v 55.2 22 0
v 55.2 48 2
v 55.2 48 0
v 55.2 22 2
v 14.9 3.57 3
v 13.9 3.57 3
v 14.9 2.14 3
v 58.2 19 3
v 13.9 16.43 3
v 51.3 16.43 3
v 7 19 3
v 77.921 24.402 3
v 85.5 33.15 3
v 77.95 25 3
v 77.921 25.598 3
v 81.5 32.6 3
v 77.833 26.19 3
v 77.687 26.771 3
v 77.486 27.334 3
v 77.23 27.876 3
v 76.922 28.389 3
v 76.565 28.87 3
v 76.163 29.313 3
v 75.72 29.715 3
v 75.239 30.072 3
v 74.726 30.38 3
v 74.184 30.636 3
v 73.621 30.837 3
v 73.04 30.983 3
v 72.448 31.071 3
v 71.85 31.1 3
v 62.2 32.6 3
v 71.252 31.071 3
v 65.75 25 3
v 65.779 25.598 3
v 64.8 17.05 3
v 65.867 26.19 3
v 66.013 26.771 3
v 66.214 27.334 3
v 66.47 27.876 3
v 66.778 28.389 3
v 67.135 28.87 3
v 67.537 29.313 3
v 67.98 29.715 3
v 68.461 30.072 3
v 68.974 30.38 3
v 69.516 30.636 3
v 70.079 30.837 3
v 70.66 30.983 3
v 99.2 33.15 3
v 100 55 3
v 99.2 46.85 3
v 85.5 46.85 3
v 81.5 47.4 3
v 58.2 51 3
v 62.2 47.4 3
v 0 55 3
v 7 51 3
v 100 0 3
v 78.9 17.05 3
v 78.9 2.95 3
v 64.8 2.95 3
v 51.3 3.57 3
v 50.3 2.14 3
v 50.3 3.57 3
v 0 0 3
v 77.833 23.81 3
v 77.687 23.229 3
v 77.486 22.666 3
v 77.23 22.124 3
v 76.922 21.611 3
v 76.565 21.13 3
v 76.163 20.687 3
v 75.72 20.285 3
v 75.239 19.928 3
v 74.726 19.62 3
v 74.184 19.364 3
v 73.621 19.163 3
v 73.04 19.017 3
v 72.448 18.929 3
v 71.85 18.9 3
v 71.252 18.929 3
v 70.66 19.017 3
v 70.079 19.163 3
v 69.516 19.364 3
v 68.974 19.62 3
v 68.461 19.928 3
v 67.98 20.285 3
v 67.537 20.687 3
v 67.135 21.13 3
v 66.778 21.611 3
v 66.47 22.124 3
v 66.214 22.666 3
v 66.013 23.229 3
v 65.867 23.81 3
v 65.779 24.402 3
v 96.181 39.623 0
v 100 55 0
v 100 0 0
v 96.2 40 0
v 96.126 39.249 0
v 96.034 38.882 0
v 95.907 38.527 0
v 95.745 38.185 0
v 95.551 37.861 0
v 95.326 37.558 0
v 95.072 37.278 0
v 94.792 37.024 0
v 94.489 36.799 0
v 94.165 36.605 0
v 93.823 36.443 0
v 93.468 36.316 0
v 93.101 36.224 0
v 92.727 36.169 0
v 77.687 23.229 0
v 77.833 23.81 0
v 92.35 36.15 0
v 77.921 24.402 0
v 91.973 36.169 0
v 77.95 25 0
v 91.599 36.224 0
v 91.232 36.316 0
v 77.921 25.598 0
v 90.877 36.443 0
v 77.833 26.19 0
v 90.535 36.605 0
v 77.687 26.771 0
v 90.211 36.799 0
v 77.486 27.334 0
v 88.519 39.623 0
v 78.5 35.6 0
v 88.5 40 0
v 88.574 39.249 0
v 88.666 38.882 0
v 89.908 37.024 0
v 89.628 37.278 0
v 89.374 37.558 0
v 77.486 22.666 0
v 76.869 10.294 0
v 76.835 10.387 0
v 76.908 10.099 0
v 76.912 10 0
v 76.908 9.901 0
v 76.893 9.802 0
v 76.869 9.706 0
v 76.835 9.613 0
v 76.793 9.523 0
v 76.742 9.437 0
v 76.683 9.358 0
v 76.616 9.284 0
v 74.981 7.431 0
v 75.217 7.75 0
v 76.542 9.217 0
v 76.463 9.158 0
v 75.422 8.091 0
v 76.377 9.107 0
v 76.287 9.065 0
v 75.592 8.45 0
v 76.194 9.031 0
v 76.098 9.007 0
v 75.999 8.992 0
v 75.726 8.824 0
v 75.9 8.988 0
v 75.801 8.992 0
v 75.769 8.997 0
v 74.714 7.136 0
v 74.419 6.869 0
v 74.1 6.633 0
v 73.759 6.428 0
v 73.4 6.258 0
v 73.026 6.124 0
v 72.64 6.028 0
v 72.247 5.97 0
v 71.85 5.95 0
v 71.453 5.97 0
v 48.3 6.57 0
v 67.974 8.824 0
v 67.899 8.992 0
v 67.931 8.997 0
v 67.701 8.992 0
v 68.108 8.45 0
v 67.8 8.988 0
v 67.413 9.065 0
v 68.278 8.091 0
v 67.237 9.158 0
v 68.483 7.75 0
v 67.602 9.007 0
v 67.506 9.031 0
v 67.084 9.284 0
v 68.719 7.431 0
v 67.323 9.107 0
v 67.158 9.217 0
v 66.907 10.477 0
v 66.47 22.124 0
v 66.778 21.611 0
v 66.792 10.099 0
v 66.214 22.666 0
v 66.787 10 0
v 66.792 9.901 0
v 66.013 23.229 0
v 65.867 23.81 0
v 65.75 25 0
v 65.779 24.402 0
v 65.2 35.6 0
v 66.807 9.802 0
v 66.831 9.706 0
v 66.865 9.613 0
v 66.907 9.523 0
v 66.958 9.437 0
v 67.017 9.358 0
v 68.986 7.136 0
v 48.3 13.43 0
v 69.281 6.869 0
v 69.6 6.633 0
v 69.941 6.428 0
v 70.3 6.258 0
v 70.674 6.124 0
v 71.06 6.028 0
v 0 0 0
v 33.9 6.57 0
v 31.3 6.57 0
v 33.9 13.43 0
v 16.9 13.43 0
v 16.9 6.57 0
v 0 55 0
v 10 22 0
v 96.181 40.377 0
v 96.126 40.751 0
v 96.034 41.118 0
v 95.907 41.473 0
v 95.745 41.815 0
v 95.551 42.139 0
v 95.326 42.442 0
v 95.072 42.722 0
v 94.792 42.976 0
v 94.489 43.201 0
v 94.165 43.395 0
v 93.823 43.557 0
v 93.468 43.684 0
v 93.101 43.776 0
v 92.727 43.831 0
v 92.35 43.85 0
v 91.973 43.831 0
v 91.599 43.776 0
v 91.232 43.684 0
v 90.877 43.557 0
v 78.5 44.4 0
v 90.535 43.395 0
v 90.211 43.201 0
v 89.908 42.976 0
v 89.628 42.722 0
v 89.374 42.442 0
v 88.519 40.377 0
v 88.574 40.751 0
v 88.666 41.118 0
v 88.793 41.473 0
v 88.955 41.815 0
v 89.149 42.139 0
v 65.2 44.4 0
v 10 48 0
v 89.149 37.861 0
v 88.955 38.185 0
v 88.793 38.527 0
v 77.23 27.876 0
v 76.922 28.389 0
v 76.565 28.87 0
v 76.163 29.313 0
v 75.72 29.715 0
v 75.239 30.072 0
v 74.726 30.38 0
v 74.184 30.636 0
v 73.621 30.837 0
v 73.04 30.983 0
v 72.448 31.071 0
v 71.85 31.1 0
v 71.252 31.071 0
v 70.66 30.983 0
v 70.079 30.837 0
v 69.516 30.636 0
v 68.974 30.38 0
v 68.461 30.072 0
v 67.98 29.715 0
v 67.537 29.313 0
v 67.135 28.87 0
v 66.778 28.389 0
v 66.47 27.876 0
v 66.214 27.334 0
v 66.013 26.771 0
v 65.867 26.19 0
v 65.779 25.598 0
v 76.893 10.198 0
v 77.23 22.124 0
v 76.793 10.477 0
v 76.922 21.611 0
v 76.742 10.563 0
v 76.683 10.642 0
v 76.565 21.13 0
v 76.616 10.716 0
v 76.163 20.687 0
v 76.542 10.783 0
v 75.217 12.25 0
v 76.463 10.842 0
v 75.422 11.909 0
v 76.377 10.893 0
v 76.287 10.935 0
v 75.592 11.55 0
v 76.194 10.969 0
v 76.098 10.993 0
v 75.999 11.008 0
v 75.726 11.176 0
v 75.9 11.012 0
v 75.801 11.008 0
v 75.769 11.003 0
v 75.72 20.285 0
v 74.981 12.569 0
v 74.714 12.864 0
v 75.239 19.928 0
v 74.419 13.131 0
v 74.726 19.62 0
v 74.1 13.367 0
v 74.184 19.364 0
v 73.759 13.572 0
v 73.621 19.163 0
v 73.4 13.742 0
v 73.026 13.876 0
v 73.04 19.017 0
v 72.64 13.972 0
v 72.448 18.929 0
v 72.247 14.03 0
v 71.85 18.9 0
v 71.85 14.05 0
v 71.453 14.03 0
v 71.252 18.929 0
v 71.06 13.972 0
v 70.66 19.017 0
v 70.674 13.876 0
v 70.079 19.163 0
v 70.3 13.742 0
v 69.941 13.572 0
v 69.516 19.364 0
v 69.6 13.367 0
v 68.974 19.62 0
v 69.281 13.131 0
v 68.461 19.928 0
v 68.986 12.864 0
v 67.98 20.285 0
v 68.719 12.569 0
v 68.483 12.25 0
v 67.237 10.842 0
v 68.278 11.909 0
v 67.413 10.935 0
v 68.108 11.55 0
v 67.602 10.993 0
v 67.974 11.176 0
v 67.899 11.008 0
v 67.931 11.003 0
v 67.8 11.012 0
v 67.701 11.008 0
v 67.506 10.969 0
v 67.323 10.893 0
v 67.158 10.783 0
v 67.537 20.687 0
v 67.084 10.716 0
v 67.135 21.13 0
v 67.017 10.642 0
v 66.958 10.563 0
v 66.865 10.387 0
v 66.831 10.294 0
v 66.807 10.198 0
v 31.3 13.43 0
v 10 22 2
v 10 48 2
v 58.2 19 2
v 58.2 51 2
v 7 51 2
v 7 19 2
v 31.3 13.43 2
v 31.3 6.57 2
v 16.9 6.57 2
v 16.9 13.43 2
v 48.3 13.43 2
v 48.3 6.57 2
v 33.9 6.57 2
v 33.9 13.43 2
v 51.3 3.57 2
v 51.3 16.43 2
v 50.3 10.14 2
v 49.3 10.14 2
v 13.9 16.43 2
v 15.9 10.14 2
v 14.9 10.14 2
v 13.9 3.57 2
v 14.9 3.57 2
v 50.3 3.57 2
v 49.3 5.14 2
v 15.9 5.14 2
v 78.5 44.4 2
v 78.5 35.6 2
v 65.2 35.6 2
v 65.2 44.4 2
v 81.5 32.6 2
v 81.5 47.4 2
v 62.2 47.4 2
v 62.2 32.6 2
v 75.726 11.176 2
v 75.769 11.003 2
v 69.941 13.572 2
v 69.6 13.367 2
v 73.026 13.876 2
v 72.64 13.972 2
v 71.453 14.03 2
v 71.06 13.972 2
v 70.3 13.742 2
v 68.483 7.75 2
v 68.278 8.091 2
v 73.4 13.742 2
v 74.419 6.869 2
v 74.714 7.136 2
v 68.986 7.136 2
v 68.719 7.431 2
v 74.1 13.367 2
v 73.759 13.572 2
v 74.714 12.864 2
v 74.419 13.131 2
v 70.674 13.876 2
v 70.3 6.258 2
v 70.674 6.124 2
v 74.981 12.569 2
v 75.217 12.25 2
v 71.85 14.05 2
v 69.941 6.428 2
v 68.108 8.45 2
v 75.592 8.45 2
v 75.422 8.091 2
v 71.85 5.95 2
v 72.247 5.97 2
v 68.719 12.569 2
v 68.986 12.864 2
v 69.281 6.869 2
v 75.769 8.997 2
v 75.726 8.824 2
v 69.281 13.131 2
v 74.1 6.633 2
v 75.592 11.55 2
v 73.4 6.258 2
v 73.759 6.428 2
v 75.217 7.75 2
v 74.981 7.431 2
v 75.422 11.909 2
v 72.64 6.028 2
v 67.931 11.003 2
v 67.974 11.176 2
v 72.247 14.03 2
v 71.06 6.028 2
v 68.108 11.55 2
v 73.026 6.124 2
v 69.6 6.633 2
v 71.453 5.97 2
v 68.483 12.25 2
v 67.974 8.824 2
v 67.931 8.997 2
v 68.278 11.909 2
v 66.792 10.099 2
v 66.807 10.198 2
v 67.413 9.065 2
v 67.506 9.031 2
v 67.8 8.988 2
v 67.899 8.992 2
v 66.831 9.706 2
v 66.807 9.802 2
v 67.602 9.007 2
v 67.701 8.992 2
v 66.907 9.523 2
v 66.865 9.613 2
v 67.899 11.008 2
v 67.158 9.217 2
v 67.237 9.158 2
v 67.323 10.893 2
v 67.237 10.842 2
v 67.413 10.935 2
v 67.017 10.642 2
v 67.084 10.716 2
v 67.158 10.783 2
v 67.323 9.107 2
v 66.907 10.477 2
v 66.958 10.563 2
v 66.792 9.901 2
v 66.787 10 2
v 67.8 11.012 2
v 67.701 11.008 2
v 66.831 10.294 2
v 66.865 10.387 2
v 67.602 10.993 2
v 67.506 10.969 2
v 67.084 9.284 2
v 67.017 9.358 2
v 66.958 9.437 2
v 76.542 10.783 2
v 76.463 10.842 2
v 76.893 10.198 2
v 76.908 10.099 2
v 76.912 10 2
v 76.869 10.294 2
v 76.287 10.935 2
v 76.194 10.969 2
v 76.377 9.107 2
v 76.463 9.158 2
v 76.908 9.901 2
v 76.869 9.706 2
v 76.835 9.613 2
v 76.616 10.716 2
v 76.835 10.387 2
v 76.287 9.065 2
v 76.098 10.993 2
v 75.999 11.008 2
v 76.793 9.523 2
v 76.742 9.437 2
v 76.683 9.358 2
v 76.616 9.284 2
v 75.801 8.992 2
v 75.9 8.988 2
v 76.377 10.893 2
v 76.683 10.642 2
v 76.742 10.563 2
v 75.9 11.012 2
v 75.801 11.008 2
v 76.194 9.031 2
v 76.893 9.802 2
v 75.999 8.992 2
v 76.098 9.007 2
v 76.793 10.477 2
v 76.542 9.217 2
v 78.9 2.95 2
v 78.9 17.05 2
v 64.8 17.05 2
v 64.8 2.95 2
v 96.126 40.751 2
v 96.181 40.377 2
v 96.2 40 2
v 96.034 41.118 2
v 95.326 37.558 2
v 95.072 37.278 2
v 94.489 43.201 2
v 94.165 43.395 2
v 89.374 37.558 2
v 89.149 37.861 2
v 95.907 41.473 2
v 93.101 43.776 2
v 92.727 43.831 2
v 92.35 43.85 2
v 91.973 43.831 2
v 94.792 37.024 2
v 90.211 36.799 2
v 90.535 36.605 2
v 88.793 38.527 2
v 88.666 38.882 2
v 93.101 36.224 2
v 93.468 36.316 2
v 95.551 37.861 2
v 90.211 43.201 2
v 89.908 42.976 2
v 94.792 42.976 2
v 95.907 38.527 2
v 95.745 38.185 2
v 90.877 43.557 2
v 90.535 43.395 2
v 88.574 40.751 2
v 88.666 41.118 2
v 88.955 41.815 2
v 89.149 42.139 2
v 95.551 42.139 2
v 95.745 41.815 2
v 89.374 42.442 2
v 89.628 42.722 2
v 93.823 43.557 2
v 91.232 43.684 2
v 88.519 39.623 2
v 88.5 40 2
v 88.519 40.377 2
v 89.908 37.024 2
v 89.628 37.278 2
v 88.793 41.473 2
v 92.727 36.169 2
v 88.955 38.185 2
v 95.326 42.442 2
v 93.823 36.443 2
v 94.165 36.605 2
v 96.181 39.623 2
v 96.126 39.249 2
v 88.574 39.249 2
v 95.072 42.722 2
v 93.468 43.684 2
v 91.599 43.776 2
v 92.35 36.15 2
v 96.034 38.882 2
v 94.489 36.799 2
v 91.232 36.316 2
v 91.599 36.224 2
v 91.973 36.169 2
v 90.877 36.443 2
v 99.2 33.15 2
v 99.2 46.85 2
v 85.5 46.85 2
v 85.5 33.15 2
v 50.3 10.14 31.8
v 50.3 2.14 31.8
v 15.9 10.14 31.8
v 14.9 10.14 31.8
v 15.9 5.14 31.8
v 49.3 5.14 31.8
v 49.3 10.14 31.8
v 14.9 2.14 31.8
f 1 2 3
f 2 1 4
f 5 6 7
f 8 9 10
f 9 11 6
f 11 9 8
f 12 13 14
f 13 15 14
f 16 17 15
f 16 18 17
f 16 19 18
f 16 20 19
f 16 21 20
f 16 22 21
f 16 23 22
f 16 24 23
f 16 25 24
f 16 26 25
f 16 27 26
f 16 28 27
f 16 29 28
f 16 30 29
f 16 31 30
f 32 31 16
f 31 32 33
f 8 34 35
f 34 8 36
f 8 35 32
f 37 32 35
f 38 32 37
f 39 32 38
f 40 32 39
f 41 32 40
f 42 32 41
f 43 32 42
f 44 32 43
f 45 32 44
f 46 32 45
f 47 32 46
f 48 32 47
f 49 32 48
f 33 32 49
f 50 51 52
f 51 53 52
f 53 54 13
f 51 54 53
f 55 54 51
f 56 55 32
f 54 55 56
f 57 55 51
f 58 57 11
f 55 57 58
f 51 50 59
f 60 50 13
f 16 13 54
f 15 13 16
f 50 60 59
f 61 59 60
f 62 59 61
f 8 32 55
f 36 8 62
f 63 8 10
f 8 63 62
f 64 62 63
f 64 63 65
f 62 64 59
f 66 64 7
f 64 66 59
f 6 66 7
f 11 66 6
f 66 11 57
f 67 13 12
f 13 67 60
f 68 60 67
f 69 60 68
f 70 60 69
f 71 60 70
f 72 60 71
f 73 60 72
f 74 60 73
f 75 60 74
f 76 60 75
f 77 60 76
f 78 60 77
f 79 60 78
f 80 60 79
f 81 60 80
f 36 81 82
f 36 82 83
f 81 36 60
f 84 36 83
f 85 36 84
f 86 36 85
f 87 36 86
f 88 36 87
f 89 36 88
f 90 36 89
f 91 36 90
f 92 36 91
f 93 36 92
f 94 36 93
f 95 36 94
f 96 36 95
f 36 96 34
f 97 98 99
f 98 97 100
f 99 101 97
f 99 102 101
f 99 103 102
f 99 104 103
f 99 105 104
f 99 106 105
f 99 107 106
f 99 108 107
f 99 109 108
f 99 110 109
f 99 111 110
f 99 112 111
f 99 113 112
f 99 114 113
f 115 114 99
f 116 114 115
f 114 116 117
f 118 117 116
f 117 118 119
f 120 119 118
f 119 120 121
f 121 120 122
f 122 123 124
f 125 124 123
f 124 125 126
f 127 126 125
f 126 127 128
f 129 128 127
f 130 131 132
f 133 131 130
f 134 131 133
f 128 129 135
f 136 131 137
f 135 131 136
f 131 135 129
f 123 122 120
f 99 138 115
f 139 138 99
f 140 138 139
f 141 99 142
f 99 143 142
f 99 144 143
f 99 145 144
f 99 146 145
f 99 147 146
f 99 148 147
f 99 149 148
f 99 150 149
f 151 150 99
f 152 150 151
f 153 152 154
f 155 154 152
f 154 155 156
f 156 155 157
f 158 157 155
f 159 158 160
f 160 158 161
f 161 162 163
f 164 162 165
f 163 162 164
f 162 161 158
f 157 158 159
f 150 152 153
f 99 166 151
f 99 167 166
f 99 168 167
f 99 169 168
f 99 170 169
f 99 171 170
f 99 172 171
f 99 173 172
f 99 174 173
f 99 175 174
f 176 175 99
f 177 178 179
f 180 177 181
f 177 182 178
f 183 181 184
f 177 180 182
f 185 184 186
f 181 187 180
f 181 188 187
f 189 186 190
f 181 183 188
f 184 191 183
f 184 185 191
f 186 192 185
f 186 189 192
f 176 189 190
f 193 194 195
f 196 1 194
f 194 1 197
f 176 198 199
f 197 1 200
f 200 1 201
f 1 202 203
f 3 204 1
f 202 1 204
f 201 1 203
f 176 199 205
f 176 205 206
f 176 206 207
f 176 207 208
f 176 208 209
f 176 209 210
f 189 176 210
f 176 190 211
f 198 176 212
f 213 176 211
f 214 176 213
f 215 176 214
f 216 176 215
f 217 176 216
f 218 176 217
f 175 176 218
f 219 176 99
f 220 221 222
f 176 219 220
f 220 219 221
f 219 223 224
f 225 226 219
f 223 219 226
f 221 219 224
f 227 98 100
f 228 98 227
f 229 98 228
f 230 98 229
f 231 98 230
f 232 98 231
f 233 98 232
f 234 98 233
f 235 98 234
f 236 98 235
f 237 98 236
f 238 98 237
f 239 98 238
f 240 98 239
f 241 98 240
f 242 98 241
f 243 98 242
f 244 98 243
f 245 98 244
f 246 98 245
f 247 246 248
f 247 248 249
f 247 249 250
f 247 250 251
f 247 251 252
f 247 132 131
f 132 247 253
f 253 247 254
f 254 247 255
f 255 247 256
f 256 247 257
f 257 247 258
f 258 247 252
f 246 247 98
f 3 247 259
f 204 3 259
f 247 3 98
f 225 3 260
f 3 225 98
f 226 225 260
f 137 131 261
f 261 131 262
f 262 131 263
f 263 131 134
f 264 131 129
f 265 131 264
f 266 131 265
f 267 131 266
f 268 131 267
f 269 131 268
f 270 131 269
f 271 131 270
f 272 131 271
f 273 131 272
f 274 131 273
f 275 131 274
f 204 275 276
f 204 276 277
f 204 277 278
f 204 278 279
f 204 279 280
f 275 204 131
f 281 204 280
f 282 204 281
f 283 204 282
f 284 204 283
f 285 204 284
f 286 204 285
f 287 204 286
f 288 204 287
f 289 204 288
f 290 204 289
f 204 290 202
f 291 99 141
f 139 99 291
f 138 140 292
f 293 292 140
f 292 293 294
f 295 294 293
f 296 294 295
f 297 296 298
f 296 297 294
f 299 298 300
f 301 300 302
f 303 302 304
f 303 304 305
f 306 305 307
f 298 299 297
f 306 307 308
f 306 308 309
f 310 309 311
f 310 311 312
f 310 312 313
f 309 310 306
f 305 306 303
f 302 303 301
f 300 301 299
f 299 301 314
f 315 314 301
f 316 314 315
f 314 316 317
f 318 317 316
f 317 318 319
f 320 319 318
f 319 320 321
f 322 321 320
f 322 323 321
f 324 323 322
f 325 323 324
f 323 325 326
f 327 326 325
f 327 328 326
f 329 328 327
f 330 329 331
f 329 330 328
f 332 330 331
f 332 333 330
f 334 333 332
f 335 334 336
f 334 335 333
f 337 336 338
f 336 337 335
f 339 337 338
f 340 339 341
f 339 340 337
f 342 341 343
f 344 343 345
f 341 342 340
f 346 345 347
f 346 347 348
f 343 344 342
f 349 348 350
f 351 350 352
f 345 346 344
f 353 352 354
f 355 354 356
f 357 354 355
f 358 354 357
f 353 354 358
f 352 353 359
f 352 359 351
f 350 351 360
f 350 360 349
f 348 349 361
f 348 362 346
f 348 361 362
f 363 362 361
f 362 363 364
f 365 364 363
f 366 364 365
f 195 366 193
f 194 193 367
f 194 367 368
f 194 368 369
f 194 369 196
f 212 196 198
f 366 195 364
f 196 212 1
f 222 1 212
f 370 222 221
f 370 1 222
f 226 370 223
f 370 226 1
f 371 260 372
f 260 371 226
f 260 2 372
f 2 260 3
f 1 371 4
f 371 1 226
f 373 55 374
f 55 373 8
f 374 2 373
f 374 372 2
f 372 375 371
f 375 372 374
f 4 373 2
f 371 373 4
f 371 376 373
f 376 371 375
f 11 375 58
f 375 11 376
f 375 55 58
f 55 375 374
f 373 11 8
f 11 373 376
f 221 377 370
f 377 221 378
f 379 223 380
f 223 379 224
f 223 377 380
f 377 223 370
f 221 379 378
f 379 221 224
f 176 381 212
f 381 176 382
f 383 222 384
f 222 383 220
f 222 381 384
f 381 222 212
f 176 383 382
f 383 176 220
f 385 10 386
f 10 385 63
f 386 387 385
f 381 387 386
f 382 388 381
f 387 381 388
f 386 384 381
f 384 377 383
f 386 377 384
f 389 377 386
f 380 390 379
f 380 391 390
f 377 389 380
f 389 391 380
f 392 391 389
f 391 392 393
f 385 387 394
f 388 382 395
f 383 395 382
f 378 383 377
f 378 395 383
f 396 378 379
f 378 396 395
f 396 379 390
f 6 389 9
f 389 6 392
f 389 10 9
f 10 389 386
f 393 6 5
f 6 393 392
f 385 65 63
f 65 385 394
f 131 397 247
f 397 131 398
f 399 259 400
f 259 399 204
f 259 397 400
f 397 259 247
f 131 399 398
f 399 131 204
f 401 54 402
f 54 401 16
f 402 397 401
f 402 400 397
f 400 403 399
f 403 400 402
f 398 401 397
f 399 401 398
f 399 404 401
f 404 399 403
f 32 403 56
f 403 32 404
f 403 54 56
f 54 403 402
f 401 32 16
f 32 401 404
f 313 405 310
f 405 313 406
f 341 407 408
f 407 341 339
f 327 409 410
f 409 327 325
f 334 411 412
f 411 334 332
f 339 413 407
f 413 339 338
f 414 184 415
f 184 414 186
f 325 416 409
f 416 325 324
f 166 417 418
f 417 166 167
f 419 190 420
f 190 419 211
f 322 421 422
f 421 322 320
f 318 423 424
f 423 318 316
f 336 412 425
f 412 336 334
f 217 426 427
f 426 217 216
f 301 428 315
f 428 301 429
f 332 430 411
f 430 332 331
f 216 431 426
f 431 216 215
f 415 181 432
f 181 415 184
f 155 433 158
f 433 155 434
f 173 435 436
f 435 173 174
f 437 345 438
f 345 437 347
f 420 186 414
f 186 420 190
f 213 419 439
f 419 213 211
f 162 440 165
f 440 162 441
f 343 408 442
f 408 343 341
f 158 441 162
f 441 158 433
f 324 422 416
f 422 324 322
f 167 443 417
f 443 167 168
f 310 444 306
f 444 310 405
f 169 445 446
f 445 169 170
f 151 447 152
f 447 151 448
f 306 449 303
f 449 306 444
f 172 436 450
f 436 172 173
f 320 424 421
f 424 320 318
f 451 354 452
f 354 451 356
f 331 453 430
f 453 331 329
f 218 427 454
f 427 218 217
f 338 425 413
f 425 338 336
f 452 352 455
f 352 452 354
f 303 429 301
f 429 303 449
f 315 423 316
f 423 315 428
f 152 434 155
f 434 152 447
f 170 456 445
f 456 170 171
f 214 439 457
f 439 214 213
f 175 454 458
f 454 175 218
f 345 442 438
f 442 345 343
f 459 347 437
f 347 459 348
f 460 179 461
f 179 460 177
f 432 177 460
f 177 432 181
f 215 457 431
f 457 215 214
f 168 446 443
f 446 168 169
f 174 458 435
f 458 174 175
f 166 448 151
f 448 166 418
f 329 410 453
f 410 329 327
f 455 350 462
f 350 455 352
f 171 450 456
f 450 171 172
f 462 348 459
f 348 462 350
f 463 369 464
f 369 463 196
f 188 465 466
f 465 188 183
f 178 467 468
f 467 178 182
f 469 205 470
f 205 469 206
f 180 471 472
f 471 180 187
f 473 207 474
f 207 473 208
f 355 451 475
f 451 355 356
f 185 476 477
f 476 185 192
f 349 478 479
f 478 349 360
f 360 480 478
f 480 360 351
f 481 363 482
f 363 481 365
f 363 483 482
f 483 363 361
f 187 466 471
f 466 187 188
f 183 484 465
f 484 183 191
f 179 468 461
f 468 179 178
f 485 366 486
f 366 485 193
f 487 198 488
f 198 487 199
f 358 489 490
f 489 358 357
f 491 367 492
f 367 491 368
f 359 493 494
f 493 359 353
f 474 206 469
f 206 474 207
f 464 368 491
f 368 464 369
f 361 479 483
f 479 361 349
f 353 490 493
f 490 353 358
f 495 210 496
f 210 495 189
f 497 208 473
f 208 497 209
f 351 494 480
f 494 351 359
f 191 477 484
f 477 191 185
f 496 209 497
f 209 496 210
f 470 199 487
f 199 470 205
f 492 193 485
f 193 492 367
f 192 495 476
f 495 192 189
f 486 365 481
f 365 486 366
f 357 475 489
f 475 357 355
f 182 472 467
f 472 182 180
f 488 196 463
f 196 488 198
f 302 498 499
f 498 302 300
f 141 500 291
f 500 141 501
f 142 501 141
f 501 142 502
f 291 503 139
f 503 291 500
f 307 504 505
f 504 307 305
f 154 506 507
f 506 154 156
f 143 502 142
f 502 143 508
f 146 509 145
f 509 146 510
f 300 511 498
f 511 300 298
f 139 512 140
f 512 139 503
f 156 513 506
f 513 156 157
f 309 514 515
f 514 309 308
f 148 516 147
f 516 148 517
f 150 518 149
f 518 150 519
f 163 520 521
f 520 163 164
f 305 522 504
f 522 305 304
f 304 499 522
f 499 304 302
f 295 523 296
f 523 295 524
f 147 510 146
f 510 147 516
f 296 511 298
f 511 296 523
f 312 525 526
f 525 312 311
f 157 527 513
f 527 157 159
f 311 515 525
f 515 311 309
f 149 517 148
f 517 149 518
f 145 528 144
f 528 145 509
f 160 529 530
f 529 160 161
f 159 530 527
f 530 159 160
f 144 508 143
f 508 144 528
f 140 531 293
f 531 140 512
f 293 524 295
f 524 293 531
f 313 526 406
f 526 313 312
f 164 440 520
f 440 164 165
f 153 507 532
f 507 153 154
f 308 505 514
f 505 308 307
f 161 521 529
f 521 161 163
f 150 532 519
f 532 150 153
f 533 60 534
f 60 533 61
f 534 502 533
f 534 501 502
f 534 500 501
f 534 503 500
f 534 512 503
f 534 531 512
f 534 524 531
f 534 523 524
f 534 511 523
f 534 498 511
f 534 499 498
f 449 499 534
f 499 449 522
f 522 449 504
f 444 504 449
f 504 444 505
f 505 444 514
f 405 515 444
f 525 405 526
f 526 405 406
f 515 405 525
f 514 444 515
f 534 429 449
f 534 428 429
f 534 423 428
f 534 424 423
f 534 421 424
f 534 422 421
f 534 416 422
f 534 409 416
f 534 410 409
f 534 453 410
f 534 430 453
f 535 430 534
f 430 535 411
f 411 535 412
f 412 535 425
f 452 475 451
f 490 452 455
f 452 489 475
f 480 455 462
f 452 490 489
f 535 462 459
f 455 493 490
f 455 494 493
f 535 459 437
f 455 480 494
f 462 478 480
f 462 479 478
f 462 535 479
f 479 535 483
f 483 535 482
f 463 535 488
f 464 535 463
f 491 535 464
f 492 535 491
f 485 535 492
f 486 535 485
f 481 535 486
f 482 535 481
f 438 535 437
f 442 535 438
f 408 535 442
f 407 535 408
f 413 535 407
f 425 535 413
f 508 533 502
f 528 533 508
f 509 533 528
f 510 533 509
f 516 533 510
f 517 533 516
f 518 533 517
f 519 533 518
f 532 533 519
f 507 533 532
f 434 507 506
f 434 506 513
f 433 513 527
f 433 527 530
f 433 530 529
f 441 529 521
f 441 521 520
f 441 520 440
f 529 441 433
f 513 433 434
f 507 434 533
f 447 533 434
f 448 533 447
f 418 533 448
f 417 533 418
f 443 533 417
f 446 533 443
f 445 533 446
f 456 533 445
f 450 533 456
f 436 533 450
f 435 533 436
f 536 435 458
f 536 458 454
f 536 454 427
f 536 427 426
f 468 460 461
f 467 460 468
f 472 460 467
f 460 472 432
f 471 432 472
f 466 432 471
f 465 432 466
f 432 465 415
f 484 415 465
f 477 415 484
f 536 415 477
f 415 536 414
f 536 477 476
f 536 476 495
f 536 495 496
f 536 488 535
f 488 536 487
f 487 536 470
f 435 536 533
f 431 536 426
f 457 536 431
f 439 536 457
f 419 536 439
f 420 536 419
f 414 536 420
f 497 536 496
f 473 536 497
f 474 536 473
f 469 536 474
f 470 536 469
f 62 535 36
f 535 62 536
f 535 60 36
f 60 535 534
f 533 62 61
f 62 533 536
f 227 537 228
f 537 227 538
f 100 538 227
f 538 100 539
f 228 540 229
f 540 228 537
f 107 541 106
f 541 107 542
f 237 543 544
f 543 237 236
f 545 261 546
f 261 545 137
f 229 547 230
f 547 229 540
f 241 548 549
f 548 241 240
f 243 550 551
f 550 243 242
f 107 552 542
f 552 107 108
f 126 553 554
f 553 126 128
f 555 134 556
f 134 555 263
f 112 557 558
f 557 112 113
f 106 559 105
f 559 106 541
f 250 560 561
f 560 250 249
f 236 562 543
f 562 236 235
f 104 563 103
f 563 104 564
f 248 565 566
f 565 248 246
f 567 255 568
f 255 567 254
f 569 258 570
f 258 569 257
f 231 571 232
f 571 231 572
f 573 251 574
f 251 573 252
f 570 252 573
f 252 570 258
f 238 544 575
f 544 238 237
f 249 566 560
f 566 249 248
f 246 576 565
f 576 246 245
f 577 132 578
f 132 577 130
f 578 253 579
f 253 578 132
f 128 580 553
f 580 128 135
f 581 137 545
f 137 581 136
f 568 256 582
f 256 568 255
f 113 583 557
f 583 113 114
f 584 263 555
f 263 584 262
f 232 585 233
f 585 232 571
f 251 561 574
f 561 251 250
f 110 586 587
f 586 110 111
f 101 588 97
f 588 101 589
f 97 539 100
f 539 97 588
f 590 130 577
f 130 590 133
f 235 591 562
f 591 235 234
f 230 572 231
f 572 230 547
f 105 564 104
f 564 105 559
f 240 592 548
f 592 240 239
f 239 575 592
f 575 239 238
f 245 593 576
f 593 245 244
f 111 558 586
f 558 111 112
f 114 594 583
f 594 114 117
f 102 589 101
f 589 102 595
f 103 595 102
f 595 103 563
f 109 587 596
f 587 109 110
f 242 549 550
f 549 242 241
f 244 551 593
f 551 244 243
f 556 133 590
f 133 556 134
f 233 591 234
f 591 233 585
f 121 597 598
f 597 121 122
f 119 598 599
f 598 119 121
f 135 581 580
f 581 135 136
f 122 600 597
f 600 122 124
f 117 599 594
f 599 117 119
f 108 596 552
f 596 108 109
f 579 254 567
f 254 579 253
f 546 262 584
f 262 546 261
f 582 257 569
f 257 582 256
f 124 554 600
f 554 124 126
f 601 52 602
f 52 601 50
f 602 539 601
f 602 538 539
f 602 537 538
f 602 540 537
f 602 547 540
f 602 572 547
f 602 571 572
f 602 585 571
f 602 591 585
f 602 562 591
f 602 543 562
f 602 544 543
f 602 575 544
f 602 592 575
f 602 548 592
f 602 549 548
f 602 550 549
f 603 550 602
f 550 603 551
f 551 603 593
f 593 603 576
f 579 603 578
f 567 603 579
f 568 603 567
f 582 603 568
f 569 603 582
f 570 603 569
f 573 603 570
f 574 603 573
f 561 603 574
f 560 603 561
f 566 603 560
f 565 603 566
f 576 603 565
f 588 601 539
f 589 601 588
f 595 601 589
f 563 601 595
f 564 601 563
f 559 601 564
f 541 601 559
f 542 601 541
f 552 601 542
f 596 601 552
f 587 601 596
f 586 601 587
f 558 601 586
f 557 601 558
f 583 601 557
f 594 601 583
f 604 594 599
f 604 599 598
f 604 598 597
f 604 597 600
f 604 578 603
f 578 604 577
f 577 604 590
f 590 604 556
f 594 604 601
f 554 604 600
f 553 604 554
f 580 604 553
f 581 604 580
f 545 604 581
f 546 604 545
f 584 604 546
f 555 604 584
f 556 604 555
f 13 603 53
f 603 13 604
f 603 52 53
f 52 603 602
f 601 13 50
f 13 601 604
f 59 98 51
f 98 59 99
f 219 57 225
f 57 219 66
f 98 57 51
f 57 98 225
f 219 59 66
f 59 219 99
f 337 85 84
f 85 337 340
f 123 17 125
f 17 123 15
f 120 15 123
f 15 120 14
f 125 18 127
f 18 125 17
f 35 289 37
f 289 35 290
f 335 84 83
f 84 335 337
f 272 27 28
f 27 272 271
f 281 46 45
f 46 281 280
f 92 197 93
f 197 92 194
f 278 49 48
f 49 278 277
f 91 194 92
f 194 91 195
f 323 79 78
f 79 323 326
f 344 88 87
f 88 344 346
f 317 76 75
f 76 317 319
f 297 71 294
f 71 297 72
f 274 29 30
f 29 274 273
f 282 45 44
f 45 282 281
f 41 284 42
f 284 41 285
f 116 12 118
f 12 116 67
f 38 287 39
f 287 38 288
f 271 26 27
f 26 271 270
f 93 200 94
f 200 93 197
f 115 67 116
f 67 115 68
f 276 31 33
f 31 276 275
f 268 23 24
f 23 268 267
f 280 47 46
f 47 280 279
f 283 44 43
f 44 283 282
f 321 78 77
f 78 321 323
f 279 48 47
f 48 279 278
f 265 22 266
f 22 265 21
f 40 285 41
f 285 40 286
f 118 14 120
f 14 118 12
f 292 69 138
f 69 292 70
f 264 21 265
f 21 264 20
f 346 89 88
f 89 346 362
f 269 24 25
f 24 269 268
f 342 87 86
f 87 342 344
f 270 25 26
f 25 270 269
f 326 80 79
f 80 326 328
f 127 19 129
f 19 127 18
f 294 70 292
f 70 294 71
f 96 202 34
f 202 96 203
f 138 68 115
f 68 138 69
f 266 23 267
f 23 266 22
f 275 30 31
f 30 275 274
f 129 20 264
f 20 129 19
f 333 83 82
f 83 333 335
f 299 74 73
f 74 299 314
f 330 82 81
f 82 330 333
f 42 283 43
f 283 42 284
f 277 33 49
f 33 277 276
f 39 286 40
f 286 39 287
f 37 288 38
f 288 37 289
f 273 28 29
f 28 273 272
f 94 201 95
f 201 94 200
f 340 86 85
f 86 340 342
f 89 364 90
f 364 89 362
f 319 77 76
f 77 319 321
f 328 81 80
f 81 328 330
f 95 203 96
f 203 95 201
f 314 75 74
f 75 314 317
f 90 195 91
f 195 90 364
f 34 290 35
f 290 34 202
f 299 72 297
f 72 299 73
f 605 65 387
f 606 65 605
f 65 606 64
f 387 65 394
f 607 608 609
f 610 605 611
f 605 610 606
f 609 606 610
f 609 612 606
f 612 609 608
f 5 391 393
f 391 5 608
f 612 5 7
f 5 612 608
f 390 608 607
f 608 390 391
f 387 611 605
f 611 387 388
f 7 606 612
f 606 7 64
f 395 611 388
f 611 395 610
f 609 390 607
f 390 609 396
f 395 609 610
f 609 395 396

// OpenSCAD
include <enclosure.scad>

// Test holes for front panel instruments
testPlate();
